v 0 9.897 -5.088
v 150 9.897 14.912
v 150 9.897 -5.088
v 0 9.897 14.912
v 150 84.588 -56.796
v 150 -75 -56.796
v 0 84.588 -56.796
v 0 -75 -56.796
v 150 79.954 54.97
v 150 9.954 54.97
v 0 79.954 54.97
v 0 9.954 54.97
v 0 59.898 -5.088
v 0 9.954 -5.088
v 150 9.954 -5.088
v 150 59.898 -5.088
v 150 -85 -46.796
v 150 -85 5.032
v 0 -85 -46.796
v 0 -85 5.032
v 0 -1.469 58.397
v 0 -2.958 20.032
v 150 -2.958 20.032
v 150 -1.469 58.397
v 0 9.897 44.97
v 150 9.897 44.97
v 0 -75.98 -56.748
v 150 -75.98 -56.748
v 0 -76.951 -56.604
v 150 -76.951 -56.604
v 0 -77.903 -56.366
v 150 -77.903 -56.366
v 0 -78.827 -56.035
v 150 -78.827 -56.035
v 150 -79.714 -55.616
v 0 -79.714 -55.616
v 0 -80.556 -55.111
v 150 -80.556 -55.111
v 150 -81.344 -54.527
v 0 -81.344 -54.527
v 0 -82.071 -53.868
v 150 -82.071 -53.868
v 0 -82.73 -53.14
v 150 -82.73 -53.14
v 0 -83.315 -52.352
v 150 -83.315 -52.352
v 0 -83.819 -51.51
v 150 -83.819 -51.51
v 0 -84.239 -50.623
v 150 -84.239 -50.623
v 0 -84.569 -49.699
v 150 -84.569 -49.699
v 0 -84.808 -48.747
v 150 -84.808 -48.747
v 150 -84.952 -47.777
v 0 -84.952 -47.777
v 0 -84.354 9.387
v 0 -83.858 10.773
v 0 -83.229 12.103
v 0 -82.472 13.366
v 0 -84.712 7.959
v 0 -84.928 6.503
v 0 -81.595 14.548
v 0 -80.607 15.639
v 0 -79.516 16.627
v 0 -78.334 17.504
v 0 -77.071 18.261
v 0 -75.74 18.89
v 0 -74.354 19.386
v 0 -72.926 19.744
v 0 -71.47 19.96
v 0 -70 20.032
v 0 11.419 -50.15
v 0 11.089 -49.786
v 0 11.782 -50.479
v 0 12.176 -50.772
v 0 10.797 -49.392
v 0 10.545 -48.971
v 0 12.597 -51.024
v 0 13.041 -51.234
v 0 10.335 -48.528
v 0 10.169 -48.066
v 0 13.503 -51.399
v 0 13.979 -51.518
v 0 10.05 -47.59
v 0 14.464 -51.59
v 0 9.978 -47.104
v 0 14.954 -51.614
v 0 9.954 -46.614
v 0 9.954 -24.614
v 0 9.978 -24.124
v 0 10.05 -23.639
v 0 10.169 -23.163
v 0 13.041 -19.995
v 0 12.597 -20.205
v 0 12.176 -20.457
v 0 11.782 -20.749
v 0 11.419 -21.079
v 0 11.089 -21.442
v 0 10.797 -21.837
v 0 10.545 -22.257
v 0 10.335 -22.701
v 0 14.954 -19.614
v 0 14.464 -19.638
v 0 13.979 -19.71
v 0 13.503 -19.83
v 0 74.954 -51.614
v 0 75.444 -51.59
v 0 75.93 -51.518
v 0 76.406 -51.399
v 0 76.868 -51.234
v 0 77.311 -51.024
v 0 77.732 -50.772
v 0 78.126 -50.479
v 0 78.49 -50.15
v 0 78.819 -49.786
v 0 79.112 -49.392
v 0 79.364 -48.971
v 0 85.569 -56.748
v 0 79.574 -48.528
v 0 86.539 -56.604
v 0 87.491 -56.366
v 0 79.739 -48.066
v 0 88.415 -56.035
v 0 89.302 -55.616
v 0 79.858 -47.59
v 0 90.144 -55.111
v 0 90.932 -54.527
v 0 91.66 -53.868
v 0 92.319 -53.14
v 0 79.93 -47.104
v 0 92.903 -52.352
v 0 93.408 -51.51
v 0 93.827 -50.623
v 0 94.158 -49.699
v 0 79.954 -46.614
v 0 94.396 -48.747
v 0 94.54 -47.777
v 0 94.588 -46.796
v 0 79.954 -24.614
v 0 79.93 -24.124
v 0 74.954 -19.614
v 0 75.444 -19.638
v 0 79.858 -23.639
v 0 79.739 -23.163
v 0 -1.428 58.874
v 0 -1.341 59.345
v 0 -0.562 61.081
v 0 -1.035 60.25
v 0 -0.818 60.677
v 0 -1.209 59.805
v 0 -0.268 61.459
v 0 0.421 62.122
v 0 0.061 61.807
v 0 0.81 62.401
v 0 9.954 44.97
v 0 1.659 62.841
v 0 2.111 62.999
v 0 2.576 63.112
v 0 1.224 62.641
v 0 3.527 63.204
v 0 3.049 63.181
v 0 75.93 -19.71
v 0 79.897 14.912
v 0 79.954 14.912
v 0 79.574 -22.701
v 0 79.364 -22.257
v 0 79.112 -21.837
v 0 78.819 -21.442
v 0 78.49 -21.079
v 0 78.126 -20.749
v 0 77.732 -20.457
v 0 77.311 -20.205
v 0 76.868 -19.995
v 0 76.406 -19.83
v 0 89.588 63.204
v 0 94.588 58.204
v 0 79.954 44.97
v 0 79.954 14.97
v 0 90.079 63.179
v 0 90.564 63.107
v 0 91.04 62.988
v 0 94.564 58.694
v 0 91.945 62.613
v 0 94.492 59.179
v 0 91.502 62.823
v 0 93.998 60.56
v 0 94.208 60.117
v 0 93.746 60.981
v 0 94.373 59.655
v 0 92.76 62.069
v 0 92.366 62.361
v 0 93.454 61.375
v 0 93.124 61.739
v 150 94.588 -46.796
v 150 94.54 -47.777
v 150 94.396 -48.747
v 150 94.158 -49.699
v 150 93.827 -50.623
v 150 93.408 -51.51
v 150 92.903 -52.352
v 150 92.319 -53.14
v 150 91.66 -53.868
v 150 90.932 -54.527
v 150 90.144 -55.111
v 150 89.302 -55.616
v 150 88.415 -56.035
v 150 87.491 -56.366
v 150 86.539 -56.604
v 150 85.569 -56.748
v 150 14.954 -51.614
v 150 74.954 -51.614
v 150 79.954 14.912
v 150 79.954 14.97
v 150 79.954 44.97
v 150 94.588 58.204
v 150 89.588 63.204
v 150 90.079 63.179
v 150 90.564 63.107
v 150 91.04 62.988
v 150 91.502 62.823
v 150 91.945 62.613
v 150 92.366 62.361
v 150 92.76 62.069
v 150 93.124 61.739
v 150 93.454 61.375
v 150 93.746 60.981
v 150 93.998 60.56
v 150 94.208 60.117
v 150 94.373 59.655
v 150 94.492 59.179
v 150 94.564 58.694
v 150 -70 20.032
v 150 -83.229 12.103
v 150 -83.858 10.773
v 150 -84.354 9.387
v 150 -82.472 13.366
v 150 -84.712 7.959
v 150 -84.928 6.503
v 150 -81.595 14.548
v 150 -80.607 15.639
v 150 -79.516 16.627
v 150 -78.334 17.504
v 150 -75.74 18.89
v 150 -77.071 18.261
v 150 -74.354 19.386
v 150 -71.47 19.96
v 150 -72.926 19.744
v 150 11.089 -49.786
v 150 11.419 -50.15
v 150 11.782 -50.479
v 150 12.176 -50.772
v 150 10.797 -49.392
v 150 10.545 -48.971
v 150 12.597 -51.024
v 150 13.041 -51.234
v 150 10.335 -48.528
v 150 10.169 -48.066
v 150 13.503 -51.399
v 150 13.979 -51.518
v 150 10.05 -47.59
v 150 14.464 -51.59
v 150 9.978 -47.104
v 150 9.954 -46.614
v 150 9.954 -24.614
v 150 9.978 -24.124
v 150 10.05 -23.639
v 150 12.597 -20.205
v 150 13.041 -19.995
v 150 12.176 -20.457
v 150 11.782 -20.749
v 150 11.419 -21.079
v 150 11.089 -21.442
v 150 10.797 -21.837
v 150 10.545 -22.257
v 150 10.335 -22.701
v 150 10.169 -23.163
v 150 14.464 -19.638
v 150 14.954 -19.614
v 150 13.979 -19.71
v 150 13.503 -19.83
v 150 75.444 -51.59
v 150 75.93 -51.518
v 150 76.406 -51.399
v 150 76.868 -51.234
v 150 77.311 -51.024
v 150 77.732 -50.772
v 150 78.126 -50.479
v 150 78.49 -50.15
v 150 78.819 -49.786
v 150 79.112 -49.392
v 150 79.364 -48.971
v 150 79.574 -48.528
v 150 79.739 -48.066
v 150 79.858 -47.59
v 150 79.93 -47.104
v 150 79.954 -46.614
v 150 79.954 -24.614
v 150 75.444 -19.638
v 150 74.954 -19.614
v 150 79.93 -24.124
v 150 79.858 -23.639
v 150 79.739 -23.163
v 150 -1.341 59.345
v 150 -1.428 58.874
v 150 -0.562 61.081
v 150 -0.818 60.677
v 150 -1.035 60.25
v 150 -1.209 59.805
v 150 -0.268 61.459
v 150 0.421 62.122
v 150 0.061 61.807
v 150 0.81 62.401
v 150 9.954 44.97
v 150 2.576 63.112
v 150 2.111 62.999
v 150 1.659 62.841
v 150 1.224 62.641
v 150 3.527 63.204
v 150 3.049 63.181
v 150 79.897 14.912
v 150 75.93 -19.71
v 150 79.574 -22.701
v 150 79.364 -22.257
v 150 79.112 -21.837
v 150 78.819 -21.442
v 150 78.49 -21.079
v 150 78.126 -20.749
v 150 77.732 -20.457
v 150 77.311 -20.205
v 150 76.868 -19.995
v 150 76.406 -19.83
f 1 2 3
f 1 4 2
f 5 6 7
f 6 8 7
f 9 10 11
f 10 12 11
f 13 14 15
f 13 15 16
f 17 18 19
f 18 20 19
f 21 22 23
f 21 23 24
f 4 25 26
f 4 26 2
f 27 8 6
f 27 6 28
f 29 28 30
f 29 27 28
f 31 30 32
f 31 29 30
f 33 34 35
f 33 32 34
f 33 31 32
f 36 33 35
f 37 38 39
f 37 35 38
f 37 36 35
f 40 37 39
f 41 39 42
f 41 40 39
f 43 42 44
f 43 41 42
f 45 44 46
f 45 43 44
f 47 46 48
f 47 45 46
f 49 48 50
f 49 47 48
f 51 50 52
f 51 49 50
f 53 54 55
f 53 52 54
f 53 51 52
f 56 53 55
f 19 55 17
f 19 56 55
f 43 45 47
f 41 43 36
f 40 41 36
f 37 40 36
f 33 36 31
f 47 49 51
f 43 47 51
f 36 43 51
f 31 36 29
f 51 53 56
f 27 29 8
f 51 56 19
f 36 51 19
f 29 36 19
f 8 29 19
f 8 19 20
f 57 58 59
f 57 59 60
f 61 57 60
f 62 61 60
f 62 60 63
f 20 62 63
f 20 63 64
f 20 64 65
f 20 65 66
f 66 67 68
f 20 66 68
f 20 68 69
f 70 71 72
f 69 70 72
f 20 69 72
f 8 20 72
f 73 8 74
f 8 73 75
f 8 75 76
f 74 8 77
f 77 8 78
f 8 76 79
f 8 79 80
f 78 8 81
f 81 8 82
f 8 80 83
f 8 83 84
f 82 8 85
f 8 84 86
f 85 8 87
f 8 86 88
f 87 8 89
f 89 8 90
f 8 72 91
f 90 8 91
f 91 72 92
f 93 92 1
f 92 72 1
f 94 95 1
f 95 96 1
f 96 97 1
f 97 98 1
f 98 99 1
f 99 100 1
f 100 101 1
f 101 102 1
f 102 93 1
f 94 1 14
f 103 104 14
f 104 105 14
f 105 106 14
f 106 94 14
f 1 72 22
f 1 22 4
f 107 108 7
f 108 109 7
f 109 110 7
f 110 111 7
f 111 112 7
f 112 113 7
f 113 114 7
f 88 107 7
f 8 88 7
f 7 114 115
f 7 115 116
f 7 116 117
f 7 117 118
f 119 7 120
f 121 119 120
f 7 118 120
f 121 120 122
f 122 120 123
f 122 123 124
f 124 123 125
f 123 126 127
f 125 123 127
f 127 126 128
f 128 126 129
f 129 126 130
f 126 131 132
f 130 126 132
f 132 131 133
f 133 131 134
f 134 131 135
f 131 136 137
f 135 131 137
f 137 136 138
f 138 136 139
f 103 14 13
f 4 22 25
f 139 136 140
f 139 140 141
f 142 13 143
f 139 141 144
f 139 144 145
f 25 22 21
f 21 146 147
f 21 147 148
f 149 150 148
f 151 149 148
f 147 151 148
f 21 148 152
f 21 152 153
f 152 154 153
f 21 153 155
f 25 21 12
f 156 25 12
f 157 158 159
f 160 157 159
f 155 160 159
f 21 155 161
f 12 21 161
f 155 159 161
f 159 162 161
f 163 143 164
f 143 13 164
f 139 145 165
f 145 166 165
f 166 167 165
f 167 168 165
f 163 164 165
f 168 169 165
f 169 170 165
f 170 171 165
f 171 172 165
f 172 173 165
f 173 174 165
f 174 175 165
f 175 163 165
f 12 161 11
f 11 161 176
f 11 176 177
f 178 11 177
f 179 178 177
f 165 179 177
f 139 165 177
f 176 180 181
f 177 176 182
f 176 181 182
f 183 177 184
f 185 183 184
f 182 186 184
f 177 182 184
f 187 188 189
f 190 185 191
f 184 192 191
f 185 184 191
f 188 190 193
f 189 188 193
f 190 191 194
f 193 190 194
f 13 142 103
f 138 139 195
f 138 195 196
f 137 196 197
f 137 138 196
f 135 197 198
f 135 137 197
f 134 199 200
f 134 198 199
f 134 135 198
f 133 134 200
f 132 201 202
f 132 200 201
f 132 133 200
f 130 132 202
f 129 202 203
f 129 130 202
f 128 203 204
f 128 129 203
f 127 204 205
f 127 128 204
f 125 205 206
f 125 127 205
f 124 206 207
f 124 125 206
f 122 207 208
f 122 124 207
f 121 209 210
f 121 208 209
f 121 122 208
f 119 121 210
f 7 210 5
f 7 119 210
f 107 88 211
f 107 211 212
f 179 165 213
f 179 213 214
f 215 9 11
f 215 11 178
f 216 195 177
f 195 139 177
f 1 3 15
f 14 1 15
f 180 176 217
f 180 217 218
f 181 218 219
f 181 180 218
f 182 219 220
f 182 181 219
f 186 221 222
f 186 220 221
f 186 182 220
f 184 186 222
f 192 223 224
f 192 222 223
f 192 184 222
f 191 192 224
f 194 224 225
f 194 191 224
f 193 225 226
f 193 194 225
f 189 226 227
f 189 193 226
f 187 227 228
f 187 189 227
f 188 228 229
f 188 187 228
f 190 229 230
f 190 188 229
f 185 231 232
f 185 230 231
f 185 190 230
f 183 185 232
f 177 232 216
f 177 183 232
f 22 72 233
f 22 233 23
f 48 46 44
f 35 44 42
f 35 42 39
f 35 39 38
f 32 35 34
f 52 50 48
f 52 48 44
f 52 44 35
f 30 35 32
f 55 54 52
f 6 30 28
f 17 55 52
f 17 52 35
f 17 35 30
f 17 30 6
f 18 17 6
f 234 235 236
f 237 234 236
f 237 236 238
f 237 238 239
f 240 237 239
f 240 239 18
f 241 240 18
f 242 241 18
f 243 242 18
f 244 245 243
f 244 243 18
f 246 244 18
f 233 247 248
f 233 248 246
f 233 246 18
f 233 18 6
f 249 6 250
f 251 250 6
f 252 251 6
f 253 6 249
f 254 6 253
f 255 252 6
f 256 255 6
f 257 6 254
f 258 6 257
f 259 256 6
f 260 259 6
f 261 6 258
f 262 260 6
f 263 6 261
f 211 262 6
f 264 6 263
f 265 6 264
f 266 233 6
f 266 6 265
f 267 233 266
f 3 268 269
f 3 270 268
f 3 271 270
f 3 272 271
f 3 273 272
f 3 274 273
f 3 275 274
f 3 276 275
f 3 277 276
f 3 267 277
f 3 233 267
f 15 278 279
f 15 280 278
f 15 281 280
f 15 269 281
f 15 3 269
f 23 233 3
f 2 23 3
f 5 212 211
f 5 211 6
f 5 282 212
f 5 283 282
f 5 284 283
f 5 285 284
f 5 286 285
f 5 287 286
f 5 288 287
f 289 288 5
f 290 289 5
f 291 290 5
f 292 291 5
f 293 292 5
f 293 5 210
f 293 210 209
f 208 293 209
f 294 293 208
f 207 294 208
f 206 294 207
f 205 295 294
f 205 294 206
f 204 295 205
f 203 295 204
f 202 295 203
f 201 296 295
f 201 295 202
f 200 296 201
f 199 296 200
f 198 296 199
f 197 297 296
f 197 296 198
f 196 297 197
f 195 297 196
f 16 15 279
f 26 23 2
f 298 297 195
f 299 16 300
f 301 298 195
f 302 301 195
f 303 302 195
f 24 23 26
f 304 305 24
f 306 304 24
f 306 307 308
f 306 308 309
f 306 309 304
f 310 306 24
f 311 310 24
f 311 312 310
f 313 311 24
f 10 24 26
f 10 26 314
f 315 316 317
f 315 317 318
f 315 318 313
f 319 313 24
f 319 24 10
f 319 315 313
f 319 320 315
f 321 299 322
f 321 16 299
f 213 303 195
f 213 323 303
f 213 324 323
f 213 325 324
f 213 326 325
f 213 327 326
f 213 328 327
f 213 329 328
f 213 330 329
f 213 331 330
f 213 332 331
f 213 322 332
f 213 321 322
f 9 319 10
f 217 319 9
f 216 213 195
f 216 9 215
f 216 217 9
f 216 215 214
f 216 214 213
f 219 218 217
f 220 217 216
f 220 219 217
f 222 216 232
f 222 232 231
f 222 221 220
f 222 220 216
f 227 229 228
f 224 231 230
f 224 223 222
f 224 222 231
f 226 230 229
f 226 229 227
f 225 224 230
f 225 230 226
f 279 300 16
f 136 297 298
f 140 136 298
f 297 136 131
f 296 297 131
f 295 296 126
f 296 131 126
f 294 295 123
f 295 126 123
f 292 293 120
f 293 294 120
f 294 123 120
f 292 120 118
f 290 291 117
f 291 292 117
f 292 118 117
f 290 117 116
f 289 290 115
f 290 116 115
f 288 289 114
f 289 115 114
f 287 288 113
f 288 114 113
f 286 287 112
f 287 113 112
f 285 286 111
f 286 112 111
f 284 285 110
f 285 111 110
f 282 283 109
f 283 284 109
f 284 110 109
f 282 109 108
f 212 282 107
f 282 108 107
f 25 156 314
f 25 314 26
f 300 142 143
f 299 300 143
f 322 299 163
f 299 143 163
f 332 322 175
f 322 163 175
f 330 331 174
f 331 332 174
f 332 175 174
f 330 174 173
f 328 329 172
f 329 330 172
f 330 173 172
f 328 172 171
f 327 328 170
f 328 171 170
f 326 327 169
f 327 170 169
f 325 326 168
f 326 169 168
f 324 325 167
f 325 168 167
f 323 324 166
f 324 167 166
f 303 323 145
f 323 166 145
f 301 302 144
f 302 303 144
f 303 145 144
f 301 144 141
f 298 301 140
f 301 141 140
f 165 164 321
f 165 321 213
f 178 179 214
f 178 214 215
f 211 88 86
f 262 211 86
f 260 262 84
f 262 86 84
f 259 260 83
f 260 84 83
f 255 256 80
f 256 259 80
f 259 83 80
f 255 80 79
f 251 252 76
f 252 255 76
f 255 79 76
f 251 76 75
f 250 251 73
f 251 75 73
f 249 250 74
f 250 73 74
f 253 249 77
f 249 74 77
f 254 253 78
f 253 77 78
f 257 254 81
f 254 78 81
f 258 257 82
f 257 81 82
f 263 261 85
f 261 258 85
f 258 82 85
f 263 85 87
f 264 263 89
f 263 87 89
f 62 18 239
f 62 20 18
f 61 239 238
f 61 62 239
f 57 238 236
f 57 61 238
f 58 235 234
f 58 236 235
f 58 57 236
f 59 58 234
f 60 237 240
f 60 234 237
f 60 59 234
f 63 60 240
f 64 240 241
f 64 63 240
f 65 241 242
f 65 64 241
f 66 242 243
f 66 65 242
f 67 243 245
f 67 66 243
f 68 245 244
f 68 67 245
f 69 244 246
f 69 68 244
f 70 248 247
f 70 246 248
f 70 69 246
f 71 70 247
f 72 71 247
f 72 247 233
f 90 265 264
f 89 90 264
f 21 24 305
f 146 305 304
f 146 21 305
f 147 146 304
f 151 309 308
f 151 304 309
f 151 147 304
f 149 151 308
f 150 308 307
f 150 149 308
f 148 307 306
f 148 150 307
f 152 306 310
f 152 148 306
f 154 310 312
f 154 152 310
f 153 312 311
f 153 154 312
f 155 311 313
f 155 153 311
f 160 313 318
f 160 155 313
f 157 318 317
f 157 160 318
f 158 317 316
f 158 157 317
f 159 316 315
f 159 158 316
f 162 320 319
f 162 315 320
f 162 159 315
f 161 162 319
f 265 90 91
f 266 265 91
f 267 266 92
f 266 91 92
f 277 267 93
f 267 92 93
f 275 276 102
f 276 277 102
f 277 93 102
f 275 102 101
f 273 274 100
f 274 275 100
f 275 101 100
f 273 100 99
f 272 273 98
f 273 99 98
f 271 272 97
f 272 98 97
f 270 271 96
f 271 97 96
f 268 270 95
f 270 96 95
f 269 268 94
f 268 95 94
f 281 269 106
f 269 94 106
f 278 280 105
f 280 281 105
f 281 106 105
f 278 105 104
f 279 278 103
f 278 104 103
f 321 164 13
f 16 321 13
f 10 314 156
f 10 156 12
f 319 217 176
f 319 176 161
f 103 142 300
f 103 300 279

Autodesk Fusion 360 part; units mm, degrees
sketch "Sketch1" plane through (0, 0, 0) normal (1, 0, 0) x (0, 1, 0)
  line L0 (-75, -56.7965) -> (84.5885, -56.7965)
  line L1 (94.5885, -46.7965) -> (94.5885, 58.2035)
  line L2 (89.5885, 63.2035) -> (3.5272, 63.2035)
  line L3 (-70, 20.0323) -> (-2.9575, 20.0323)
  line L4 (-2.9575, 20.0323) -> (-1.469, 58.3973)
  line L5 (-97.4281, 59.7817) -> (-104.34, 62.6519) construction
  line L6 (-1.3367, 61.8082) -> (1.7233, 63.2035) construction
  line L7 (-85, 23.6607) -> (-92.9575, 20.0323) construction
  line L8 (-85, 51.039) -> (-85, 54.6209)
  line L9 (-85, 5.0323) -> (-85, -46.7965)
  line L10 (94.5885, -56.7965) -> (-33.3617, 20.0323) construction
  line L11 (-104.34, 62.6519) -> (-85, 51.039) construction
  line L12 (79.9542, 44.9695) -> (9.9542, 44.9695)
  line L13 (9.9542, 44.9695) -> (9.9542, 14.9695)
  line L14 (79.9542, 14.9695) -> (79.9542, 44.9695)
  line L15 (9.8967, -5.088) -> (59.8985, -5.088)
  line L16 (9.8971, 14.912) -> (9.8967, -5.088)
  line L17 (67.3, 44.9695) -> (94.5885, 63.2035) construction
  line L18 (79.9542, 14.9695) -> (59.8985, -5.088)
  line L19 (-85, -56.7965) -> (9.8969, 6.6131) construction
  line L20 (22.3522, 14.9356) -> (22.4384, 14.9932) construction
  line L21 (79.9542, 44.9695) -> (9.8971, 44.9695)
  line L22 (9.8971, 44.9695) -> (9.8971, 14.912)
  line L23 (9.8971, 14.912) -> (79.9542, 14.912)
  line L24 (79.9542, 14.912) -> (79.9542, 44.9695)
  line L25 (9.9542, 14.9695) -> (59.8985, 14.9695)
  line L26 (59.8985, 14.9695) -> (59.8985, -5.088)
  line L27 (59.8985, -5.088) -> (9.9542, -5.088)
  line L28 (9.9542, -5.088) -> (9.9542, 14.9695)
  arc A0 (-70, 20.0323) -> (-85, 5.0323) centre (-70, 5.0323) ccw
  arc A1 (84.5885, -56.7965) -> (94.5885, -46.7965) centre (84.5885, -46.7965) ccw
  arc A2 (-85, -46.7965) -> (-75, -56.7965) centre (-75, -46.7965) ccw
  arc A3 (94.5885, 58.2035) -> (89.5885, 63.2035) centre (89.5885, 58.2035) ccw
  arc A4 (3.5272, 63.2035) -> (-1.469, 58.3973) centre (3.5272, 58.2035) ccw
  line L29 (79.9542, 44.9695) -> (9.9542, 44.9695)
  line L30 (9.9542, 44.9695) -> (9.9542, 54.9695)
  line L31 (9.9542, 54.9695) -> (79.9542, 54.9695)
  line L32 (79.9542, 54.9695) -> (79.9542, 44.9695)
  line L33 (74.9542, -19.6144) -> (14.9542, -19.6144)
  line L34 (9.9542, -24.6144) -> (9.9542, -46.6144)
  line L35 (14.9542, -51.6144) -> (74.9542, -51.6144)
  line L36 (79.9542, -46.6144) -> (79.9542, -24.6144)
  arc A5 (14.9542, -19.6144) -> (9.9542, -24.6144) centre (14.9542, -24.6144) ccw
  arc A6 (9.9542, -46.6144) -> (14.9542, -51.6144) centre (14.9542, -46.6144) ccw
  arc A7 (79.9542, -24.6144) -> (74.9542, -19.6144) centre (74.9542, -24.6144) ccw
  arc A8 (74.9542, -51.6144) -> (79.9542, -46.6144) centre (74.9542, -46.6144) ccw
  point P0 (79.9542, -19.6144)
  point P1 (9.9542, -19.6144)
  point P2 (79.9542, -51.6144)
  dimension "d1" = 180
  dimension "d2" = 120
  dimension "d3" = 90
  dimension "d4" = 40
  dimension "d5" = 70
  dimension "d6" = 30
  dimension "d10" = 15
  dimension "d11" = 10
  dimension "d12" = 10
  dimension "d13" = 5
  dimension "d14" = 5
  dimension "d15" = 70
  dimension "d16" = 10
  dimension "d17" = 70
  dimension "d18" = 32
  dimension "d19" = 5
  dimension "d20" = 5
  dimension "d21" = 5
  dimension "d22" = 5
extrude "Extrude1" add sketch "Sketch1" along normal blind 150
sketch "Sketch2" plane through (0, 0, 0) normal (0, 1, 0) x (1, 0, 0)
  line L0 (15.2809, -58.615) -> (135.2809, -58.615)
